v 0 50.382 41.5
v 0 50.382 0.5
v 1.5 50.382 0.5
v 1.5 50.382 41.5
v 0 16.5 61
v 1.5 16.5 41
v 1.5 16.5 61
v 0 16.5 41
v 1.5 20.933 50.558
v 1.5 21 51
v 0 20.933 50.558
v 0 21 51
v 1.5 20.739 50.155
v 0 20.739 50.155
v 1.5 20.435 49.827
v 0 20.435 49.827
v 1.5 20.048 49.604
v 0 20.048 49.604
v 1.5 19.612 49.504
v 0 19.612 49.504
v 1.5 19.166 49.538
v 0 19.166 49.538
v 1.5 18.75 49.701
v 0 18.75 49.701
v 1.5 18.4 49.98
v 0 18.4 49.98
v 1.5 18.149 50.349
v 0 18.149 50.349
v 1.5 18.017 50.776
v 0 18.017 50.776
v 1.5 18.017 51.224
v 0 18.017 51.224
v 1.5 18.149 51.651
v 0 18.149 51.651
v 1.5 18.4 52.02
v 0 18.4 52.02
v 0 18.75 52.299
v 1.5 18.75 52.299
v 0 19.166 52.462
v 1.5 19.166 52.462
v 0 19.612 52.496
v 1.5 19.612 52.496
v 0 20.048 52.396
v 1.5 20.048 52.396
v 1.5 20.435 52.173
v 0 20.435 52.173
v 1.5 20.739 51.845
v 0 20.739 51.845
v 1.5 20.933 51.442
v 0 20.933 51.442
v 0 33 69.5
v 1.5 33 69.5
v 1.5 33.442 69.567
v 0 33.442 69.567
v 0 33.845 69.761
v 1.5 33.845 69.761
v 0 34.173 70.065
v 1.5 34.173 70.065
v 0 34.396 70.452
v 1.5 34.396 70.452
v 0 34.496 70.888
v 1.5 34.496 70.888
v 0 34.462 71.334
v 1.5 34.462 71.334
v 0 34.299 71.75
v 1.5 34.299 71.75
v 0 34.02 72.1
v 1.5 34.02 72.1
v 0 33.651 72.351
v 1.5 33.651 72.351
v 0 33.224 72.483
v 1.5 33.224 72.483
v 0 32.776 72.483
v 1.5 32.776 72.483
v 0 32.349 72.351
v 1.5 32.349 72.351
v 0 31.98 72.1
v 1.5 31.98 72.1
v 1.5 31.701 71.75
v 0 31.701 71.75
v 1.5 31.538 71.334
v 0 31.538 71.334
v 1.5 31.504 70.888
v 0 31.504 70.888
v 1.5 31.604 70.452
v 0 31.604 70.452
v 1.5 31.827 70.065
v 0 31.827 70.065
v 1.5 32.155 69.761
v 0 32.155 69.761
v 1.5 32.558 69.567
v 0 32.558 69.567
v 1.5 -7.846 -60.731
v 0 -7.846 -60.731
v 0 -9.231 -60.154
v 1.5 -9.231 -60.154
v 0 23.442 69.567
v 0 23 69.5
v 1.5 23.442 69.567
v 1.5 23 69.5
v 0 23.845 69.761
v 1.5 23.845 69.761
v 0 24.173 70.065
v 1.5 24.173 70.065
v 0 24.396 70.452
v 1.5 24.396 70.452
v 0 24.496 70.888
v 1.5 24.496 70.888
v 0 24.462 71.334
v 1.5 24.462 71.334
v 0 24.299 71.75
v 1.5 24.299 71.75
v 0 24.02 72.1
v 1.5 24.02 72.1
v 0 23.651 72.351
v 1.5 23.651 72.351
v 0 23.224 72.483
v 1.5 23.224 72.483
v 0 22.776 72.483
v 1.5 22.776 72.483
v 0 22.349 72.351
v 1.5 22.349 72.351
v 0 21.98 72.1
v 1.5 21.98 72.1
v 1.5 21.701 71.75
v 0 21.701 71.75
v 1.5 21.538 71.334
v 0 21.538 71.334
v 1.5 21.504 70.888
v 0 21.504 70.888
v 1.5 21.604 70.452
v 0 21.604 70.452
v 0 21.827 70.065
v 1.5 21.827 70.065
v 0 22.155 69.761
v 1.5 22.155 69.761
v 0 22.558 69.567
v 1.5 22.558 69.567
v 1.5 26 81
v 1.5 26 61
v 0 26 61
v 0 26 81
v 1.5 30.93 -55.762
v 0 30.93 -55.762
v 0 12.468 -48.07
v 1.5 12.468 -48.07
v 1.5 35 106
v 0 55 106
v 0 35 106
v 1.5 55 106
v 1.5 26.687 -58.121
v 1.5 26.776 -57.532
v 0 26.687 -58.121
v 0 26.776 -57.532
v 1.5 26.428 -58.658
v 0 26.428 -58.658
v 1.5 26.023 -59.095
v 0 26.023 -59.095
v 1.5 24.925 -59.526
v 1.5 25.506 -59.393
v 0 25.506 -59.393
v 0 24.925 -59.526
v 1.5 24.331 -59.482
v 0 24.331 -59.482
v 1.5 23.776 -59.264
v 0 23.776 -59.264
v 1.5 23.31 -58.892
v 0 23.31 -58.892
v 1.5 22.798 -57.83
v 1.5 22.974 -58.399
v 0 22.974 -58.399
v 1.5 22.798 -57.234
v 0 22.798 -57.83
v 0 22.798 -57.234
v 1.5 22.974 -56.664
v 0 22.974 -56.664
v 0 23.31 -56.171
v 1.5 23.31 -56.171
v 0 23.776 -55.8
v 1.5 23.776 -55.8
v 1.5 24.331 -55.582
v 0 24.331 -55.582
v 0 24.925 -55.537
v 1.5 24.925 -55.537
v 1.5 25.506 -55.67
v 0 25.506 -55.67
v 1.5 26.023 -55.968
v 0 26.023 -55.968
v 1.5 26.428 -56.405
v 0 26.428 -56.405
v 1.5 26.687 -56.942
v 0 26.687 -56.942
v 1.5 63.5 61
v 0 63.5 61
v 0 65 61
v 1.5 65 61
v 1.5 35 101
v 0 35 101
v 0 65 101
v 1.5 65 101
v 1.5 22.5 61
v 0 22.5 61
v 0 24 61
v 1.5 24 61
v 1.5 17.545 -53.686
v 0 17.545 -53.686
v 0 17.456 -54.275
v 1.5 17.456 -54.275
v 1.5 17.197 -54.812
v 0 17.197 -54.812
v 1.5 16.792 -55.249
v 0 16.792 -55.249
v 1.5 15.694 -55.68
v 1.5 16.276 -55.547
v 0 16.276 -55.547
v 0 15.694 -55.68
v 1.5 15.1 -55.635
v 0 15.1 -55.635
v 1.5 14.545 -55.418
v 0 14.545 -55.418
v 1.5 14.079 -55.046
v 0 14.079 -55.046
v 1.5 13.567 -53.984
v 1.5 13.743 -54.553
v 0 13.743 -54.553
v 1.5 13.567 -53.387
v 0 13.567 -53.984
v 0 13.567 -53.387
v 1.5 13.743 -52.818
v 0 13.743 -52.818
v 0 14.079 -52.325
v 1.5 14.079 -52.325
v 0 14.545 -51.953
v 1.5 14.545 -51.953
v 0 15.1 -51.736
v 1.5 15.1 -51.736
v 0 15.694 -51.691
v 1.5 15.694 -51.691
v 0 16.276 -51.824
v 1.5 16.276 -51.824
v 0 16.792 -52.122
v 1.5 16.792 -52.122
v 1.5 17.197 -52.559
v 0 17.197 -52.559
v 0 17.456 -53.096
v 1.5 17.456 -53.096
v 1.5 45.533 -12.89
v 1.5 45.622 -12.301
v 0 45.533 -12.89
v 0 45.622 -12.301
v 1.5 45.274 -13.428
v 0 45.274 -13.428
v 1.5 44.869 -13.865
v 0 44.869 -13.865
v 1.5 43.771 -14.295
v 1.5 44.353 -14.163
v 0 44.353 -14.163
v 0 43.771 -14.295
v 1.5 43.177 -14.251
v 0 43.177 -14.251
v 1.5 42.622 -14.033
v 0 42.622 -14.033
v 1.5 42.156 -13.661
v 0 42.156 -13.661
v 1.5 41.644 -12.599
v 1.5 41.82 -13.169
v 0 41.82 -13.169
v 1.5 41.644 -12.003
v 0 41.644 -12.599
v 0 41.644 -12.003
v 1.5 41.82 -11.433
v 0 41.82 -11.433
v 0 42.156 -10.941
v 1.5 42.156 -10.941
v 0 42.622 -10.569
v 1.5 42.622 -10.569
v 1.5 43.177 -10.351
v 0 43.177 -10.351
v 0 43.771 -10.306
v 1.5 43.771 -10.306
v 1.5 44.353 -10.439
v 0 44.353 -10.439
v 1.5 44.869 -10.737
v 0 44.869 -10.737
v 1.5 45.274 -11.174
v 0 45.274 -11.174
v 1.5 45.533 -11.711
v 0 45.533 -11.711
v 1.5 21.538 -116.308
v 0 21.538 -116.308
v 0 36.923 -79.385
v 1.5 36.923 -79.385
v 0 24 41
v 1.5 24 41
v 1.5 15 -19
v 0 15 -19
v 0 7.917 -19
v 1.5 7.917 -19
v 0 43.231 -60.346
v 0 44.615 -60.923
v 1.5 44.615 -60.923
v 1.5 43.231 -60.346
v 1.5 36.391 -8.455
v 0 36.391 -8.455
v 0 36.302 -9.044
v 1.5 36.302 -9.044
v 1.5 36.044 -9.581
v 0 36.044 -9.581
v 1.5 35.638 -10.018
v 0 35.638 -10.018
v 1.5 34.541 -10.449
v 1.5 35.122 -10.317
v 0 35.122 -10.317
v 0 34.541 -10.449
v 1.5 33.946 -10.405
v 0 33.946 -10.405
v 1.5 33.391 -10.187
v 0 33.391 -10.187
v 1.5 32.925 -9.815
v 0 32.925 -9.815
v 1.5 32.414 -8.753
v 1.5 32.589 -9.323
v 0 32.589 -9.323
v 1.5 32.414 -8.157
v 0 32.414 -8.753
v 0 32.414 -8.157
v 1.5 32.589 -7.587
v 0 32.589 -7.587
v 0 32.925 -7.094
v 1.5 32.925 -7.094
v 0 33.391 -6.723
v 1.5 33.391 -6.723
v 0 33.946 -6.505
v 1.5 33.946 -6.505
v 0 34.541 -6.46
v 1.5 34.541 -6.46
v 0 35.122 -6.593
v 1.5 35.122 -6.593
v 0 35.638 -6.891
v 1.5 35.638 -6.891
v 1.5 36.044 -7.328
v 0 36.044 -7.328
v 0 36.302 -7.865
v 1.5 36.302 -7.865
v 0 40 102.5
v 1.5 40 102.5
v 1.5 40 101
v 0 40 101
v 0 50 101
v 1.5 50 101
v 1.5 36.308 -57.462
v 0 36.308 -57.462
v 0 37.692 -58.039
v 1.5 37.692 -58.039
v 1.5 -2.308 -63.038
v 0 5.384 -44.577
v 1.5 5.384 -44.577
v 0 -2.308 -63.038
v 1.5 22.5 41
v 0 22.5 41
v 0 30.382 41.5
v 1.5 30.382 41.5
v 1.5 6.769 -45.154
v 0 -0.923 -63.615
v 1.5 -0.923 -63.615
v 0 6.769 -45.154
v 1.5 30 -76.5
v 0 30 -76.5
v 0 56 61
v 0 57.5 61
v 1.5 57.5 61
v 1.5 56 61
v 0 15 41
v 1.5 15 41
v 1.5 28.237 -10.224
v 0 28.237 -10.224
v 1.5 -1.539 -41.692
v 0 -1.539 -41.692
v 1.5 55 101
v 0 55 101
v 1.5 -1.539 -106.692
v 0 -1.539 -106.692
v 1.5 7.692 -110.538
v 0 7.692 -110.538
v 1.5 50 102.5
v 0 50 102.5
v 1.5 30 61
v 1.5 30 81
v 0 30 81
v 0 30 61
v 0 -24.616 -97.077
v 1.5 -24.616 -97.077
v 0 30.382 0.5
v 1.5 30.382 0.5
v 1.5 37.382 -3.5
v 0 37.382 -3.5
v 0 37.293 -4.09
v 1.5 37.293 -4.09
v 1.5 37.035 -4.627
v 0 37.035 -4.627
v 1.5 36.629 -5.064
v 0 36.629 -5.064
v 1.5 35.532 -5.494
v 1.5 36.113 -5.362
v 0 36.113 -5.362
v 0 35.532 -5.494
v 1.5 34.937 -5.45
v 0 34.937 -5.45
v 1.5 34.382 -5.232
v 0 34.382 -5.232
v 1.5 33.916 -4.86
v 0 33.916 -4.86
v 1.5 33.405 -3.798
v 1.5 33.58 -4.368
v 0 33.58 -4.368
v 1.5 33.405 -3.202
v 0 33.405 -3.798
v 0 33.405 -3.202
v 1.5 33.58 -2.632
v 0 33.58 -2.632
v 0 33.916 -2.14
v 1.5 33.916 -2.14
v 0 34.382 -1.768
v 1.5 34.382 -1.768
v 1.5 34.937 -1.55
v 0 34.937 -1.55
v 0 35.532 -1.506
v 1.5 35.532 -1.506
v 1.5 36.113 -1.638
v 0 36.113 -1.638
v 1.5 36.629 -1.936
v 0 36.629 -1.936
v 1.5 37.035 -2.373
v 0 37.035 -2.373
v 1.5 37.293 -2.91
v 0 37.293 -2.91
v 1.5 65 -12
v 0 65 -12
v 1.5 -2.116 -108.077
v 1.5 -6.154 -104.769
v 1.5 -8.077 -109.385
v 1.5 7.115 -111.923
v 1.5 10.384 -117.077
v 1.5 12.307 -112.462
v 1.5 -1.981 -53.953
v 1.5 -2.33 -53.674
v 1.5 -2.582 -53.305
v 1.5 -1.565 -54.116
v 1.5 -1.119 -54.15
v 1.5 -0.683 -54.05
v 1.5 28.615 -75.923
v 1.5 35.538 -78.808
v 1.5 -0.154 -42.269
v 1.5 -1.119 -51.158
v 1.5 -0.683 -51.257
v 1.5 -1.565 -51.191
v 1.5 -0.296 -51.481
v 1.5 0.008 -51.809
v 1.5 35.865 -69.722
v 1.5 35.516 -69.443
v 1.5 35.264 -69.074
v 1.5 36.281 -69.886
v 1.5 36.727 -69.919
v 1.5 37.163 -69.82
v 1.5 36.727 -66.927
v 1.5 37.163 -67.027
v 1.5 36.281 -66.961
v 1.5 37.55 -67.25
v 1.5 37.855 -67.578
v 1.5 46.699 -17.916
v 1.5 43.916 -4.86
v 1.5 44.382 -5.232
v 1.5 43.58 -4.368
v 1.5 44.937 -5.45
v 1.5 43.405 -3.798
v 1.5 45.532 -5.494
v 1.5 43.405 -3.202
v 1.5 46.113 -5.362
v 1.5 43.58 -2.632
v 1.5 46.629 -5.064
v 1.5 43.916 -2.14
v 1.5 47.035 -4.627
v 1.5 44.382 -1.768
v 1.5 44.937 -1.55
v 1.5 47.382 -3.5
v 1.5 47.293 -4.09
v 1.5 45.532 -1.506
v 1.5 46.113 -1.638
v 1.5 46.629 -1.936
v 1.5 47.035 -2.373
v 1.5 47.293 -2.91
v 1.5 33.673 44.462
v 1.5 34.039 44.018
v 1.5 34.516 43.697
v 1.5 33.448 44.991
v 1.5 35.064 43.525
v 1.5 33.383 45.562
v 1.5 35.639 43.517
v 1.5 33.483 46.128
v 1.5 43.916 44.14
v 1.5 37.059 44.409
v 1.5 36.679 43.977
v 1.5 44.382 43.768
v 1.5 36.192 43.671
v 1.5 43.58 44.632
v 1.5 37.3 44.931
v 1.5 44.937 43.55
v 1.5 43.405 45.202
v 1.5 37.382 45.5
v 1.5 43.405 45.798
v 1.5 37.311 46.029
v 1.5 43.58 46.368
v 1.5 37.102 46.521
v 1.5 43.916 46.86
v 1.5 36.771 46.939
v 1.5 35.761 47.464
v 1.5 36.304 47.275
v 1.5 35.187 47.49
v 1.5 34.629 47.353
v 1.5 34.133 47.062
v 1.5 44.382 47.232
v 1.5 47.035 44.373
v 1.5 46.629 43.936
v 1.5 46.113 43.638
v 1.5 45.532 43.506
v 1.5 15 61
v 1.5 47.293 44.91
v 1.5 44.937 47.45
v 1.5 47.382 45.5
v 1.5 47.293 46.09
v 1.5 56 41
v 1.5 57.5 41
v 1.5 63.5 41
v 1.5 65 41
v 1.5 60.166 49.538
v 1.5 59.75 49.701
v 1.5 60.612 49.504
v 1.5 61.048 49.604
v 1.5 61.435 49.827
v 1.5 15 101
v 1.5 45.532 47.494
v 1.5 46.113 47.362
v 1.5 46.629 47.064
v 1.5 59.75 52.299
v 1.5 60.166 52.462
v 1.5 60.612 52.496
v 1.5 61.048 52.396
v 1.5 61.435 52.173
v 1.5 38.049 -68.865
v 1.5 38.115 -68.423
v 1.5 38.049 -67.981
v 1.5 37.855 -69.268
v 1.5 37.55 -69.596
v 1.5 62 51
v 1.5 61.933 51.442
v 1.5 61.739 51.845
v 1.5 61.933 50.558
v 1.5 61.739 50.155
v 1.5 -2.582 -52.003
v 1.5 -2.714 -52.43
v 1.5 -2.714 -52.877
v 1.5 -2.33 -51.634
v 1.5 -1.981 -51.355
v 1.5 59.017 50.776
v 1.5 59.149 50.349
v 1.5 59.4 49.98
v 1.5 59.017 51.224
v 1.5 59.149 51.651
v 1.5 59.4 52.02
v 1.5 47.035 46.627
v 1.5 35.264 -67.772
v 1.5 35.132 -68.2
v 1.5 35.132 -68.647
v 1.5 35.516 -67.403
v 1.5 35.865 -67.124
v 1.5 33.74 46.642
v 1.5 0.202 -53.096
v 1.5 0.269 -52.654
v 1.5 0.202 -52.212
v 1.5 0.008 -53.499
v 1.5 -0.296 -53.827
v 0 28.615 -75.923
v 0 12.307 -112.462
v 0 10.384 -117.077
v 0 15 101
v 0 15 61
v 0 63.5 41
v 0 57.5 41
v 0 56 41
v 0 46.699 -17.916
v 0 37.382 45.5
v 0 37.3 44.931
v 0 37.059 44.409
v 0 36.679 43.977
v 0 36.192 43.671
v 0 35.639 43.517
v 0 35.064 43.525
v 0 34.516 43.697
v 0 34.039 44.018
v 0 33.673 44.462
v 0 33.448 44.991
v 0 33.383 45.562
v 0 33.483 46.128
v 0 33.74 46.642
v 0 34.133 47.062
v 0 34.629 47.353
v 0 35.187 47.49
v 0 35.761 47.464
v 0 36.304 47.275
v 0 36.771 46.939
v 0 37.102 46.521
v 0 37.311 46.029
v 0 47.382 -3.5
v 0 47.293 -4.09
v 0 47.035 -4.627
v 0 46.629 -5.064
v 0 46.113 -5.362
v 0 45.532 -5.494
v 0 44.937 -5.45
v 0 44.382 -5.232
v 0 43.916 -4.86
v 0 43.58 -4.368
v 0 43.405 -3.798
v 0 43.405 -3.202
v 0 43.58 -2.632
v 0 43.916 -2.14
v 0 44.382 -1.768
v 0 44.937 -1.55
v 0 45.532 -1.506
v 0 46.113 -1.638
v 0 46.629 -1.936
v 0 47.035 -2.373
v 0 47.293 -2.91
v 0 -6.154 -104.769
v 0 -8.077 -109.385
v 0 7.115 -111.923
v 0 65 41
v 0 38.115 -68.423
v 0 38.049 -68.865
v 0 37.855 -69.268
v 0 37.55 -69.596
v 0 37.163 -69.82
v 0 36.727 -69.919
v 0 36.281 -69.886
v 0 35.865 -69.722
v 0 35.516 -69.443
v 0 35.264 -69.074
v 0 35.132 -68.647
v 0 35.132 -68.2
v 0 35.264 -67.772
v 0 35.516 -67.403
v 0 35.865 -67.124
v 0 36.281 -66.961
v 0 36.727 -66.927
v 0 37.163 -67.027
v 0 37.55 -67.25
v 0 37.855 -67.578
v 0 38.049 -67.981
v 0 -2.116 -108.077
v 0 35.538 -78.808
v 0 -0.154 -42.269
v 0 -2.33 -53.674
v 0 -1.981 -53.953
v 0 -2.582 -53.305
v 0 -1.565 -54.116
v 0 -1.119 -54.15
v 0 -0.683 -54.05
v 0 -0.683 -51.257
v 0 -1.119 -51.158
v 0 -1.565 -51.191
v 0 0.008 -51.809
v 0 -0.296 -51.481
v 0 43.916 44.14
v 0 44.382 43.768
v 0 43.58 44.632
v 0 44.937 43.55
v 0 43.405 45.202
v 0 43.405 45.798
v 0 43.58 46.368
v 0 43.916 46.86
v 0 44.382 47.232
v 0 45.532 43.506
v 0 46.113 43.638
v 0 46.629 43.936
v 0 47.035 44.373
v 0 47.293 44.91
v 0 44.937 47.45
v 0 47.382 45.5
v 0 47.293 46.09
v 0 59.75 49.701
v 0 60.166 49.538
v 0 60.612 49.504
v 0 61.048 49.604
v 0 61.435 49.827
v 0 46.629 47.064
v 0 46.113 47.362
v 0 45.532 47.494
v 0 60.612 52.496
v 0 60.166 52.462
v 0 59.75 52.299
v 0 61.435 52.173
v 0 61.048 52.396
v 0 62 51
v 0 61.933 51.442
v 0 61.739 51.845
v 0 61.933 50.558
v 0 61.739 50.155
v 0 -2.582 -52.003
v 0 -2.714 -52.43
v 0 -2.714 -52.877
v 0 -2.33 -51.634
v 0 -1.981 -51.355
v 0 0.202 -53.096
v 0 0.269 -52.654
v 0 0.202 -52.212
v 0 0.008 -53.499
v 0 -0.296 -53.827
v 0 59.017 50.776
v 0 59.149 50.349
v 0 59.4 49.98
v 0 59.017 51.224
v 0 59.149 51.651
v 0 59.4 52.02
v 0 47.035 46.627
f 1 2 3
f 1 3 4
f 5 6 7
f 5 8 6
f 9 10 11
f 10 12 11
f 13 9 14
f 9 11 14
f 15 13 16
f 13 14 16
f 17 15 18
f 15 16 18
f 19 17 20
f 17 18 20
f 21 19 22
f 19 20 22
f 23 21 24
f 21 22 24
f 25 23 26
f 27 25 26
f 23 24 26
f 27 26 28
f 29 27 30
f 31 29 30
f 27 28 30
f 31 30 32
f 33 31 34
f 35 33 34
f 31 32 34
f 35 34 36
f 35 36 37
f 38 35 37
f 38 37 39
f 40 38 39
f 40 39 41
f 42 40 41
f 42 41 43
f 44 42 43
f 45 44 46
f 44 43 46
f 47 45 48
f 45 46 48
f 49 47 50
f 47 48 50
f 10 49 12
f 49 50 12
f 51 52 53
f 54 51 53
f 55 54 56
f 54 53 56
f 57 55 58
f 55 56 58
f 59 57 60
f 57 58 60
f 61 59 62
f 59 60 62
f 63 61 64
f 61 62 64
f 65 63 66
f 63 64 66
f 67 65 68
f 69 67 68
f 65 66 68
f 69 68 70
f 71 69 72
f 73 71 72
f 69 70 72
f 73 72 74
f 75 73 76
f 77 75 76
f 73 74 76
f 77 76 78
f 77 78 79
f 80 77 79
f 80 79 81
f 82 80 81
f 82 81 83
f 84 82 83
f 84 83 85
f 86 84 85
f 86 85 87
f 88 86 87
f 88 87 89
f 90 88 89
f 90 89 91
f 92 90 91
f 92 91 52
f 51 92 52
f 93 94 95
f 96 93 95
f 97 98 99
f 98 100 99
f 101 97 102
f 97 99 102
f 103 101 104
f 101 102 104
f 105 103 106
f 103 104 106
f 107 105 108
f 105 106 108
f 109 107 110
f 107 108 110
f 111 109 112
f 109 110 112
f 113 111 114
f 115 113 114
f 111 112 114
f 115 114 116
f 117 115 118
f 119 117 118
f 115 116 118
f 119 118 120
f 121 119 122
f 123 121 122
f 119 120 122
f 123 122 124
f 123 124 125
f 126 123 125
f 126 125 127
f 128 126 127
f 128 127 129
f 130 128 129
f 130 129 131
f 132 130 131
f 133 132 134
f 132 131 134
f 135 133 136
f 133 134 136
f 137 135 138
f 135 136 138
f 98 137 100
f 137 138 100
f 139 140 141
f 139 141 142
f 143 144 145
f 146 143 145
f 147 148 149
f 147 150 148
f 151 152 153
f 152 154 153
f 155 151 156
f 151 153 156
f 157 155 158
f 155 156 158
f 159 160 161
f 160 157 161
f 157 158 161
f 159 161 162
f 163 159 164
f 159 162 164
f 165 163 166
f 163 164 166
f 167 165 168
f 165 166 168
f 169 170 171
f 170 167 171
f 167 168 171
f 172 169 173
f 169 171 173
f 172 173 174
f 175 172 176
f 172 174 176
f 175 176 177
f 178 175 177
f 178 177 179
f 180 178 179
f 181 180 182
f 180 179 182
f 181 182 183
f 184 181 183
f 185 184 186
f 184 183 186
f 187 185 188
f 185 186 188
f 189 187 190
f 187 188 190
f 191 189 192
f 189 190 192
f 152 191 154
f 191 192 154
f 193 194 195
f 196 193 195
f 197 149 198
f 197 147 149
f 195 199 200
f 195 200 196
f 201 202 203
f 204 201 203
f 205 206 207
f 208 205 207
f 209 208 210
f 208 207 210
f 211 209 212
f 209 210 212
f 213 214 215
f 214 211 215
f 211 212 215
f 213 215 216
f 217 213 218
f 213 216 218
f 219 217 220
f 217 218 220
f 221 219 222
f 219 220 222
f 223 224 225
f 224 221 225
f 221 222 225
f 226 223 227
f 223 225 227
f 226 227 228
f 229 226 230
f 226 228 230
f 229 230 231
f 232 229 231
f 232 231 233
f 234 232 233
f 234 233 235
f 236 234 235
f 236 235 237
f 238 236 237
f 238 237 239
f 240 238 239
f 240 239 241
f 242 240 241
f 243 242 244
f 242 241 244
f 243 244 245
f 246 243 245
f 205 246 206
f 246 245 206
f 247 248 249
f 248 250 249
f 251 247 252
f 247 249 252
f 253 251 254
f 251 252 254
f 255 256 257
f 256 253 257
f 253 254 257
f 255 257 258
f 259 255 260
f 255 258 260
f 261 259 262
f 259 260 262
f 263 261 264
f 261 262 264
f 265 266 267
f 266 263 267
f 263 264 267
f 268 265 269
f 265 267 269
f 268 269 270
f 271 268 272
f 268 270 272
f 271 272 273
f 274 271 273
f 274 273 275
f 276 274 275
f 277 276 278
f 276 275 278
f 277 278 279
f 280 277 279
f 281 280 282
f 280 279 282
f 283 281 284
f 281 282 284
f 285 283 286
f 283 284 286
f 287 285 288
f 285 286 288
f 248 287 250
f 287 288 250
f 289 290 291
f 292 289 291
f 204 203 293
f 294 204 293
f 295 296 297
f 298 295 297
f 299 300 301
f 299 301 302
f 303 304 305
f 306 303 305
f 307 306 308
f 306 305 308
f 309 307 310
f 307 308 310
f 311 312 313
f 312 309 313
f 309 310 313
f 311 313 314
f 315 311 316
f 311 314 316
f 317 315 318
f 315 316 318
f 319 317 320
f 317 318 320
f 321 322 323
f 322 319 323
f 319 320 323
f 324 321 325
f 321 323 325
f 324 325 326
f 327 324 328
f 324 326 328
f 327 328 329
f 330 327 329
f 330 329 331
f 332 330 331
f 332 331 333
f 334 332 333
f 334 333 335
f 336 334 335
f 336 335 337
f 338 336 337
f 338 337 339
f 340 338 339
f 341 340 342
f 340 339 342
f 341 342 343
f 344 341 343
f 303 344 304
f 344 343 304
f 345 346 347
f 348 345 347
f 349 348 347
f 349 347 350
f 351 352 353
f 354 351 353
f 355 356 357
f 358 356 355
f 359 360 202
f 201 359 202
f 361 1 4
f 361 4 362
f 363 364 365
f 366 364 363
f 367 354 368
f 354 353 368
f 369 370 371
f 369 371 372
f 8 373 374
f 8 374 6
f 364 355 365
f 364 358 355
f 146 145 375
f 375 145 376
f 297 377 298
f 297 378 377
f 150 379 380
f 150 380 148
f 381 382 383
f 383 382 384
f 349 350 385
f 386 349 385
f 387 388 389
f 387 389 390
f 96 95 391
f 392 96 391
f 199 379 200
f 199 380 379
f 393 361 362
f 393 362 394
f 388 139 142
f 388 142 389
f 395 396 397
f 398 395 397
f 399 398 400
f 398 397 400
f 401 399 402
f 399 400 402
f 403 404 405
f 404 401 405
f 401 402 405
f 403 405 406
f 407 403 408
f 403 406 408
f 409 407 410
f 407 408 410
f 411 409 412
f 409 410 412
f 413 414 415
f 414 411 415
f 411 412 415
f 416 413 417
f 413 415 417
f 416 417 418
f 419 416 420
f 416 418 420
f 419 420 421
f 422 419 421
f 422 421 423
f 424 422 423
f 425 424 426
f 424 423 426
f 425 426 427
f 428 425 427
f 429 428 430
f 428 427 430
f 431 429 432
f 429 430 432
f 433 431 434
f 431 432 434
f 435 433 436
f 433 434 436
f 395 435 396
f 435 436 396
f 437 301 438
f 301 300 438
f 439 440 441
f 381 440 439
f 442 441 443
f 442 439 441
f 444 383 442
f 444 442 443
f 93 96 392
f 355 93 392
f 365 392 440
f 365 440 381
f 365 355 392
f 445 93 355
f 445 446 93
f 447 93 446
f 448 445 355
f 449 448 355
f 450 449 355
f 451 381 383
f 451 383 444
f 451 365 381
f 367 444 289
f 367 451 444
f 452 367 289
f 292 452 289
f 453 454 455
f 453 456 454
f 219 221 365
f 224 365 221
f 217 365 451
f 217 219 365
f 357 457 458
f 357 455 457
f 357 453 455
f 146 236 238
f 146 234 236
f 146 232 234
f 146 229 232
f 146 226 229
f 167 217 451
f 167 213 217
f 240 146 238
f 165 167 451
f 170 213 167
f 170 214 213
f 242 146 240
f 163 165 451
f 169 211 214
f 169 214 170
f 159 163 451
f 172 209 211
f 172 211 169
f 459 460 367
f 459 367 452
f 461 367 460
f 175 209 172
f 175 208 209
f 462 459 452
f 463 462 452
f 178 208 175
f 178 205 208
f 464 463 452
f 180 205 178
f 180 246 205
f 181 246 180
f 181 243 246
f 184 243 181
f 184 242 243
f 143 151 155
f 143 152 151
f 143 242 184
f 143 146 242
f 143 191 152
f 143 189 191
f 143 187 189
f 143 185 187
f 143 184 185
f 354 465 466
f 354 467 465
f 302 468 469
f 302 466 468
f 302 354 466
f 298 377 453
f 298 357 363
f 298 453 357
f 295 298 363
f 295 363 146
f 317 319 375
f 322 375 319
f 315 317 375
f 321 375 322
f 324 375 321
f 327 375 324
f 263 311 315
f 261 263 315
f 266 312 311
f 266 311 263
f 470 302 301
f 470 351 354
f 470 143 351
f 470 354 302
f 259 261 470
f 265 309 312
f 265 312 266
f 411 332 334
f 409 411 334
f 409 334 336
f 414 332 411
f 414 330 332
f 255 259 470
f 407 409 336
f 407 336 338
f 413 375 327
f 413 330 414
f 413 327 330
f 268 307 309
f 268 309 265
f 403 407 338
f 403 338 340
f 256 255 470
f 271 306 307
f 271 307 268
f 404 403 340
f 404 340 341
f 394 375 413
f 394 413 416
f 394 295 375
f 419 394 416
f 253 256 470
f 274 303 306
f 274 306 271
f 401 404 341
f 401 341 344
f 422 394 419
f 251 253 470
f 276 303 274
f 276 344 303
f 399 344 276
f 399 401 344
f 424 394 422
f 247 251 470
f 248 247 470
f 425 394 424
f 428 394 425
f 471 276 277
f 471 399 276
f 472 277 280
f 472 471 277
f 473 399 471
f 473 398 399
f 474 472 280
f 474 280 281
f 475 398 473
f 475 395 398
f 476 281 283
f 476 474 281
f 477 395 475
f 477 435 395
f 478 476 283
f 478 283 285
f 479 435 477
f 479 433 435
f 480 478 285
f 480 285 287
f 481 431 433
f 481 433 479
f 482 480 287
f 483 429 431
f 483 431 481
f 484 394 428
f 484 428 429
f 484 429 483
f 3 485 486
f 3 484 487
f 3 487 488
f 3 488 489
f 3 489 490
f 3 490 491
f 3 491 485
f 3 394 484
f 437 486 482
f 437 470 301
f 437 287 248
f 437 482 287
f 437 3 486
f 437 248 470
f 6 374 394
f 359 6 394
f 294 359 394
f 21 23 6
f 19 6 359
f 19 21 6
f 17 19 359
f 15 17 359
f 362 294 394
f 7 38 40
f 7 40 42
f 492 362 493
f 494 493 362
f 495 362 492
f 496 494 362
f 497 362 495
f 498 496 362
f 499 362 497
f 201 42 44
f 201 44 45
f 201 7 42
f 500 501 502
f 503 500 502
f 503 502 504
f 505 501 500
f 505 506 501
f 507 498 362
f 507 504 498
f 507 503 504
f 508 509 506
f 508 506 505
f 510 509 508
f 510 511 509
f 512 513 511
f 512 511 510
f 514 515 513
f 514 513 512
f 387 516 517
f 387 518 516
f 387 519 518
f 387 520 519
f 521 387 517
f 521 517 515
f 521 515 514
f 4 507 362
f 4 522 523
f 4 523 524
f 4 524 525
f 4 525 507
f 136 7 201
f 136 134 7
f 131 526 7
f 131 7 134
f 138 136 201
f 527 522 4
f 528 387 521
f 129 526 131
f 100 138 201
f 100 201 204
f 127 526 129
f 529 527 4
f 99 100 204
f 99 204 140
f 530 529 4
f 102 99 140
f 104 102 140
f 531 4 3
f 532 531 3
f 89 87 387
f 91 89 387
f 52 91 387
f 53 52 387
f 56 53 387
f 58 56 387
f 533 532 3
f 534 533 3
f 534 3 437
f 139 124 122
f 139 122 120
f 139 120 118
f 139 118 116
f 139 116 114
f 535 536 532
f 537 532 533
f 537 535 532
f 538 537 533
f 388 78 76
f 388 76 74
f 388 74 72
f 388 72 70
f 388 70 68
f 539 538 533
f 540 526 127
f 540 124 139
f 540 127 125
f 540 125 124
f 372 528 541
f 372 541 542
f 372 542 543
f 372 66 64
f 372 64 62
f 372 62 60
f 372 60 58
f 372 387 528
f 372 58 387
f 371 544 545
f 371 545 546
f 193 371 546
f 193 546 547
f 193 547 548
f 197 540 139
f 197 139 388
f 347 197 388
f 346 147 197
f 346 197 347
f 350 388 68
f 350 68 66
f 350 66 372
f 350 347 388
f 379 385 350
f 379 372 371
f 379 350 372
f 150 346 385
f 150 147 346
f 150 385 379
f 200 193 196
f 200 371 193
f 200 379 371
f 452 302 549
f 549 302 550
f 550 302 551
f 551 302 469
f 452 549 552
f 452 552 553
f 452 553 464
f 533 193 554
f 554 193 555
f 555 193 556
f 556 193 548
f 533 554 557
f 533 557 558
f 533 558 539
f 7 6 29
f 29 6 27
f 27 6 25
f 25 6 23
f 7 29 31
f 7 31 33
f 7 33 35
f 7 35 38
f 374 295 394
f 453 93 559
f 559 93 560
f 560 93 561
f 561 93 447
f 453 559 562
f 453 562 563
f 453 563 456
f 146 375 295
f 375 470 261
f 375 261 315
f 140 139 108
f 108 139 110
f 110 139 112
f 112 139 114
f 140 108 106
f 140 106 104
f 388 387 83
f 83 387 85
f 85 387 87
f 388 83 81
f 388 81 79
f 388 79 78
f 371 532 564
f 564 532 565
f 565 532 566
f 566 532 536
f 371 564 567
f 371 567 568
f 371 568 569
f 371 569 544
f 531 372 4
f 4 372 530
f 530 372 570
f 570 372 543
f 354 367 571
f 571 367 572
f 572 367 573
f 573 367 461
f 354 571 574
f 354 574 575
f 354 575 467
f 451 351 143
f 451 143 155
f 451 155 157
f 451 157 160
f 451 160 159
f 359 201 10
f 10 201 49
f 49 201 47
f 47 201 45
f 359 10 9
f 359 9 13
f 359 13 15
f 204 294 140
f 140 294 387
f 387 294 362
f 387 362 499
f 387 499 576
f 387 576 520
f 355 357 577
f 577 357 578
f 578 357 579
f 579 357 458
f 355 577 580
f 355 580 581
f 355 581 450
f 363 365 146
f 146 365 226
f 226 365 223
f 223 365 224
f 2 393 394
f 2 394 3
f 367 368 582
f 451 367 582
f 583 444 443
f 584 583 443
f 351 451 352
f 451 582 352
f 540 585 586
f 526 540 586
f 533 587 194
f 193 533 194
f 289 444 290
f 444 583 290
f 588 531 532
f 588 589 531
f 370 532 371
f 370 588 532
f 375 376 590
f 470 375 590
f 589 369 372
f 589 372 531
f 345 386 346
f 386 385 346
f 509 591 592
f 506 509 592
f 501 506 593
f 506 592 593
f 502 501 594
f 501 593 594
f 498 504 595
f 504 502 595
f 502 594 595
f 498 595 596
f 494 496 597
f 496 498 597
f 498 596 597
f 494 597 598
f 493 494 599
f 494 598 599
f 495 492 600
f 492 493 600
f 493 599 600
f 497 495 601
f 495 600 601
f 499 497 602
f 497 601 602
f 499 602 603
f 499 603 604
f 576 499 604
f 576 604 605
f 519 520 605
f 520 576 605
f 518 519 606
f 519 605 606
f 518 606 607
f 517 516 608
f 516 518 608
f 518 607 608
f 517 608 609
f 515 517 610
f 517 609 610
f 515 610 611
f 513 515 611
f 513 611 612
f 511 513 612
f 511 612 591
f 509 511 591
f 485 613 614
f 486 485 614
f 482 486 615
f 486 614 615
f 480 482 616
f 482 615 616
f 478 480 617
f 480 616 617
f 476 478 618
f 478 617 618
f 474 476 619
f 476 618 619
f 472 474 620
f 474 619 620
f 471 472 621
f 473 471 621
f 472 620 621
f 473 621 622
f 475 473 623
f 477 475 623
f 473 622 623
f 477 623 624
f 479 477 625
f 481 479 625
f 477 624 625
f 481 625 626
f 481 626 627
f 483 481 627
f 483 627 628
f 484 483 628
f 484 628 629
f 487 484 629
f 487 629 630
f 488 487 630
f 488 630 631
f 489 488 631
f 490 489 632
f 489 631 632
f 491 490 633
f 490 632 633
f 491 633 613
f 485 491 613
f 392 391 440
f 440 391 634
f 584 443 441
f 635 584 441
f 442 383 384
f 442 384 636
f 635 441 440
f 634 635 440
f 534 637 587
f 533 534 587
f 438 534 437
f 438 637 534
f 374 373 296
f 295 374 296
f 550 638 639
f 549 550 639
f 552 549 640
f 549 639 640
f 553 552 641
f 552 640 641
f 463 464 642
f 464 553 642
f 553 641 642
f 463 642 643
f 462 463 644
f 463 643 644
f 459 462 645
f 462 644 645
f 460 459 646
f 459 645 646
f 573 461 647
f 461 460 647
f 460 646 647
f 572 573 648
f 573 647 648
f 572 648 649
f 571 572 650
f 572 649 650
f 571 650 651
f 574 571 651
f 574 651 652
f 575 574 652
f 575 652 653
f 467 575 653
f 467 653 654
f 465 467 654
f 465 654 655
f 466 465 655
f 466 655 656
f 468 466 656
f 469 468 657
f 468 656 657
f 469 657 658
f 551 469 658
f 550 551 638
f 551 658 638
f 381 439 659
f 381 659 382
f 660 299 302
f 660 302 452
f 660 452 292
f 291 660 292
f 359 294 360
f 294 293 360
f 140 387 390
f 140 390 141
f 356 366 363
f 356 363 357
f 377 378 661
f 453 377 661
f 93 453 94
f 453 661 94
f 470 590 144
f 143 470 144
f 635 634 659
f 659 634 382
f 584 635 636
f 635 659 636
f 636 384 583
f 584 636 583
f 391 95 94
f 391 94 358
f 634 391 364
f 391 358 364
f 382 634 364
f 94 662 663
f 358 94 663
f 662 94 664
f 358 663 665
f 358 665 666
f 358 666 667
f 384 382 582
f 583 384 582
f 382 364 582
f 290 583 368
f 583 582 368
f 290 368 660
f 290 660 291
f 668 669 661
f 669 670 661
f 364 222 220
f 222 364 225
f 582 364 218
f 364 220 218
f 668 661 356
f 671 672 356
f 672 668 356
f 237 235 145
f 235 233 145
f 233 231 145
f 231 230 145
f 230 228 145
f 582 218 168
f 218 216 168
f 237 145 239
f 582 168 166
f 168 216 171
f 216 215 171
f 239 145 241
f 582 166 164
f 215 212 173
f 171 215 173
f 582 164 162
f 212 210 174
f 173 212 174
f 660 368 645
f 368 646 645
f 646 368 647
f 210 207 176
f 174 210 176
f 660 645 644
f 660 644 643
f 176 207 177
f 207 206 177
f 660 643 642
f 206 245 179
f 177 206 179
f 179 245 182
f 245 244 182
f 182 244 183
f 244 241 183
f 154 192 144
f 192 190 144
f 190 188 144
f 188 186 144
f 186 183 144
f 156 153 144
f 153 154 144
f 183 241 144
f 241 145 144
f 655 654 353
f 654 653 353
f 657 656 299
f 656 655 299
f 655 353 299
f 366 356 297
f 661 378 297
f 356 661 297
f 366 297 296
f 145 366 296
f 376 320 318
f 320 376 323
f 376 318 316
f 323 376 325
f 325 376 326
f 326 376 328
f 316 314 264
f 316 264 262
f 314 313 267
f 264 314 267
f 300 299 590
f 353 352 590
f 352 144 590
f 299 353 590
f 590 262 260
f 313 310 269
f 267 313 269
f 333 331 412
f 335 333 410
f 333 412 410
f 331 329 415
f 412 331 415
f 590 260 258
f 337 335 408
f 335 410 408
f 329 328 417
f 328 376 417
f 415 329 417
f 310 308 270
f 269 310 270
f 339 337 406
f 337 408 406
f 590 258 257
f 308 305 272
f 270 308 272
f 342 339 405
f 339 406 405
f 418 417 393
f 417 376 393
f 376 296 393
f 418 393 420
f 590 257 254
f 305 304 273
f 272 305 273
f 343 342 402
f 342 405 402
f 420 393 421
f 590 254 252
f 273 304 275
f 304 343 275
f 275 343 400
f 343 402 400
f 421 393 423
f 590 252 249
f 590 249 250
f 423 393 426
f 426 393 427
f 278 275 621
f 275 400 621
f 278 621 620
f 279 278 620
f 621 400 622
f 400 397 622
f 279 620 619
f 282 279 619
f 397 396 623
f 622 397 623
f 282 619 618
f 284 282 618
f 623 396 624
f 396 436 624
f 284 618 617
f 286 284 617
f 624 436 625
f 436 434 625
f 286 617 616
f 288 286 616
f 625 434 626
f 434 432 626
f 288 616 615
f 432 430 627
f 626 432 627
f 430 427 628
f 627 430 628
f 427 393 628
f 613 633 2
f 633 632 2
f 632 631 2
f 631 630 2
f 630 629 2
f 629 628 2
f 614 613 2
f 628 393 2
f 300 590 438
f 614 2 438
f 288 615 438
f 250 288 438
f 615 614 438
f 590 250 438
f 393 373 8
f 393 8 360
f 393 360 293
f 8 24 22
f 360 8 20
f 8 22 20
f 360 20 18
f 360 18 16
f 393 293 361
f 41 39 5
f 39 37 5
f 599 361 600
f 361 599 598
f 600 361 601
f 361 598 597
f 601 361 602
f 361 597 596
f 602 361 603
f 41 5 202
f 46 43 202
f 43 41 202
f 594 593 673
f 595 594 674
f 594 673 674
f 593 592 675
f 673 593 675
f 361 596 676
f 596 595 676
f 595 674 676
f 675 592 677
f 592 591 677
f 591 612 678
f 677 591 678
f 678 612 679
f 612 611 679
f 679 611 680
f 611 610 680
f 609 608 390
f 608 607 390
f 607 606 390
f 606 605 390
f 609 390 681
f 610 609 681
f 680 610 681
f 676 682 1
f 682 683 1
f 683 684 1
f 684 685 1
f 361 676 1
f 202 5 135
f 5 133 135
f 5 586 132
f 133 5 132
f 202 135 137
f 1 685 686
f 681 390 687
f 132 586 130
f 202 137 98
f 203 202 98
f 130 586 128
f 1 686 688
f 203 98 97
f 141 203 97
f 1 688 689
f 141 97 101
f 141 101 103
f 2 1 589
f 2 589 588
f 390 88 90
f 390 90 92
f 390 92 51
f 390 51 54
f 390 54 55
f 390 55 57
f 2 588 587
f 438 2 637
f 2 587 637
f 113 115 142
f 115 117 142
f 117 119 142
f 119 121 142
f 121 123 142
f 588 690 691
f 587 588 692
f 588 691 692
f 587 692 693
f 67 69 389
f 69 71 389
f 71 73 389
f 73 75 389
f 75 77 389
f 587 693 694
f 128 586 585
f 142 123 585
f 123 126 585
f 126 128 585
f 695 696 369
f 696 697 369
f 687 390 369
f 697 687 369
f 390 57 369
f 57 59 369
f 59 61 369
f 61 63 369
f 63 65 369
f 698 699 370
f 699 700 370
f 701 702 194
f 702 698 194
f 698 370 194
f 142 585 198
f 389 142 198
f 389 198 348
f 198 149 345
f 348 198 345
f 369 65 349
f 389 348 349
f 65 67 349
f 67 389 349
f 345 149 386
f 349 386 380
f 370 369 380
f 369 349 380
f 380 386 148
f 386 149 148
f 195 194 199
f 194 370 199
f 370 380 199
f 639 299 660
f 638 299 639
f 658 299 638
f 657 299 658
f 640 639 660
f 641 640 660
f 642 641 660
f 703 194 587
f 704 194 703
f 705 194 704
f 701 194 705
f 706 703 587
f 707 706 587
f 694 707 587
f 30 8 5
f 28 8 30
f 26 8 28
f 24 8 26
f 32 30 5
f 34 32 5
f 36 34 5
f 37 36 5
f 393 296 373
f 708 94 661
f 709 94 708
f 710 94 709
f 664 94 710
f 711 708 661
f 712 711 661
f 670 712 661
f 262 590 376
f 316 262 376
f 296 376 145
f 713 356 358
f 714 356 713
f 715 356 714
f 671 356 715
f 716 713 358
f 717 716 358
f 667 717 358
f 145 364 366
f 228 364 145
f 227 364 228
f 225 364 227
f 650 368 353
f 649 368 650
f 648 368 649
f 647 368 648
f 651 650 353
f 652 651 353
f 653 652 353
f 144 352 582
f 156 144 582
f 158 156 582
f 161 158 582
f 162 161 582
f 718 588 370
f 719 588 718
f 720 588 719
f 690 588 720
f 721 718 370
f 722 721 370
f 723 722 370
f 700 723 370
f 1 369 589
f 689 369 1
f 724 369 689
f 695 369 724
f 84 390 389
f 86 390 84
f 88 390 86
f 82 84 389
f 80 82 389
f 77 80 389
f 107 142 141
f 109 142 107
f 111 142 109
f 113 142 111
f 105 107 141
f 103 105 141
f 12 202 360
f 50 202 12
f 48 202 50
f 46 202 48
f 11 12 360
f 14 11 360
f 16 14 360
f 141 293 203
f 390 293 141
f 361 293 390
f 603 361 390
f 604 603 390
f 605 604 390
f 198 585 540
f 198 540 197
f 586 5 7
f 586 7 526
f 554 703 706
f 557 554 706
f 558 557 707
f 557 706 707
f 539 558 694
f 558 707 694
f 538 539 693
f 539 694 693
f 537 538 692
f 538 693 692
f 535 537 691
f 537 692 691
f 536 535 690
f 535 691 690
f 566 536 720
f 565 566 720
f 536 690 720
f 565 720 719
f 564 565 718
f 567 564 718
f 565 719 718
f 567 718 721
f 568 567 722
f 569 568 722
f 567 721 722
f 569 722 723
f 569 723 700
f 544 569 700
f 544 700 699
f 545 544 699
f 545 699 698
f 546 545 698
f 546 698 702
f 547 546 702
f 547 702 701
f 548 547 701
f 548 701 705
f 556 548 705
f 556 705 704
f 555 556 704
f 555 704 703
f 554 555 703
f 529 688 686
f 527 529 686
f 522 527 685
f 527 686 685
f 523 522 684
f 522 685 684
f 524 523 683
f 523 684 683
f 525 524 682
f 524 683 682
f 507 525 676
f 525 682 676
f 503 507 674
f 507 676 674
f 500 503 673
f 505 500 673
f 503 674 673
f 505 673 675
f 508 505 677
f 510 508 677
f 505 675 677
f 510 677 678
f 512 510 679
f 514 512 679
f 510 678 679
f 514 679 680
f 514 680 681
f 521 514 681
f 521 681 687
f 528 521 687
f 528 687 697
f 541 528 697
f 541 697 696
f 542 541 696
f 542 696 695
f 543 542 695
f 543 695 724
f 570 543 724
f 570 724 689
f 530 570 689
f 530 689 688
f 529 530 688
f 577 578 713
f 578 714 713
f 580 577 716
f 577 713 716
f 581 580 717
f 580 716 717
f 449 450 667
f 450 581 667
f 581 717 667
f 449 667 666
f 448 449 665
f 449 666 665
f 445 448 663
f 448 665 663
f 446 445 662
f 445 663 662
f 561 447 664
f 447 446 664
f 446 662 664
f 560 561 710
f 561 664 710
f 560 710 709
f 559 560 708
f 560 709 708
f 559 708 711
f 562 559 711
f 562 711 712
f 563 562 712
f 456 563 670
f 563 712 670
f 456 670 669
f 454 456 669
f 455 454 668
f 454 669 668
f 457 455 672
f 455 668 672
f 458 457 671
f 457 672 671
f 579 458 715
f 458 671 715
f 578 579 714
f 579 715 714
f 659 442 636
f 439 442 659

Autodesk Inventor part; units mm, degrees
ref_plane "YZ Plane" through (0, 0, 0) normal (1, 0, 0) x (0, 1, 0)
ref_plane "XZ Plane" through (0, 0, 0) normal (0, 1, 0) x (-1, 0, 0)
ref_plane "XY Plane" through (0, 0, 0) normal (0, 0, 1) x (1, 0, 0)
sketch "Sketch1" plane through (0, 0, 0) normal (1, 0, 0) x (0, 1, 0)
  line L0 (12, -9) -> (2, -9)
  line L1 (2, -9) -> (2, 41)
  line L2 (2, 41) -> (7, 41)
  line L3 (7, 41) -> (7, 31)
  line L4 (7, 31) -> (12, 31)
  line L5 (12, 31) -> (12, -9)
  line L6 (2, 111) -> (12, 111)
  line L7 (12, 111) -> (12, 71)
  line L8 (12, 71) -> (7, 71)
  line L9 (7, 71) -> (7, 61)
  line L10 (7, 61) -> (2, 61)
  line L11 (2, 61) -> (2, 111)
  line L12 (7, 54.5) -> (7, 55)
  line L13 (7, 55) -> (62, 55)
  arc A0 (64, 57) -> (62, 55) centre (64, 55) ccw
  line L14 (64, 57) -> (65, 57)
  arc A1 (67, 55) -> (65, 57) centre (65, 55) ccw
  line L15 (67, 55) -> (102, 55)
  arc A2 (104, 57) -> (102, 55) centre (104, 55) ccw
  line L16 (104, 57) -> (105, 57)
  arc A3 (107, 55) -> (105, 57) centre (105, 55) ccw
  line L17 (107, 55) -> (107, 47)
  arc A4 (105, 45) -> (107, 47) centre (105, 47) ccw
  line L18 (105, 45) -> (104, 45)
  arc A5 (102, 47) -> (104, 45) centre (104, 47) ccw
  line L19 (102, 47) -> (67, 47)
  arc A6 (65, 45) -> (67, 47) centre (65, 47) ccw
  line L20 (65, 45) -> (64, 45)
  arc A7 (62, 47) -> (64, 45) centre (64, 47) ccw
  line L21 (62, 47) -> (7, 47)
  line L22 (7, 47) -> (7, 47.5)
  line L23 (7, 47.5) -> (-5, 47.5)
  line L24 (-5, 47.5) -> (-5, 41)
  line L25 (-5, 41) -> (0, 41)
  line L26 (0, 41) -> (0, 2.0396)
  line L27 (0, 2.0396) -> (0.3922, 1.9612)
  line L28 (0.3922, 1.9612) -> (0, 1.0198)
  line L29 (0, 1.0198) -> (0, 0)
  line L30 (0, 0) -> (-0.3922, 0.0784)
  line L31 (-0.3922, 0.0784) -> (-15.377, -35.885)
  line L32 (-15.377, -35.885) -> (-19.9924, -33.9619)
  line L33 (-19.9924, -33.9619) -> (-22.4924, -39.9619)
  line L34 (-22.4924, -39.9619) -> (-11.4155, -44.5773)
  line L35 (-11.4155, -44.5773) -> (-11.2232, -44.1158)
  line L36 (-11.2232, -44.1158) -> (39.5461, -65.2696)
  arc A8 (42.1615, -64.1927) -> (39.5461, -65.2696) centre (41.3922, -66.0388) ccw
  line L37 (42.1615, -64.1927) -> (43.0845, -64.5773)
  arc A9 (44.1615, -67.1927) -> (43.0845, -64.5773) centre (42.3153, -66.4235) ccw
  line L38 (44.1615, -67.1927) -> (76.4692, -80.6542)
  arc A10 (79.0845, -79.5773) -> (76.4692, -80.6542) centre (78.3153, -81.4235) ccw
  line L39 (79.0845, -79.5773) -> (80.0076, -79.9619)
  arc A11 (81.0845, -82.5773) -> (80.0076, -79.9619) centre (79.2384, -81.8081) ccw
  line L40 (81.0845, -82.5773) -> (78.0076, -89.9619)
  arc A12 (75.3922, -91.0388) -> (78.0076, -89.9619) centre (76.1615, -89.1927) ccw
  line L41 (75.3922, -91.0388) -> (74.4692, -90.6542)
  arc A13 (73.3922, -88.0388) -> (74.4692, -90.6542) centre (75.2384, -88.8081) ccw
  line L42 (73.3922, -88.0388) -> (41.0845, -74.5773)
  arc A14 (38.4692, -75.6542) -> (41.0845, -74.5773) centre (39.2384, -73.8081) ccw
  line L43 (38.4692, -75.6542) -> (37.5461, -75.2696)
  arc A15 (36.4692, -72.6542) -> (37.5461, -75.2696) centre (38.3153, -73.4235) ccw
  line L44 (36.4692, -72.6542) -> (-14.3001, -51.5004)
  line L45 (-14.3001, -51.5004) -> (-14.1078, -51.0388)
  line L46 (-14.1078, -51.0388) -> (-25.1847, -46.4235)
  line L47 (-25.1847, -46.4235) -> (-27.6847, -52.4235)
  line L48 (-27.6847, -52.4235) -> (-23.0693, -54.3465)
  line L49 (-23.0693, -54.3465) -> (-38.8385, -92.1927)
  line L50 (-38.8385, -92.1927) -> (-47.3001, -86.5004)
  line L51 (-47.3001, -86.5004) -> (-30.377, -45.885)
  line L52 (-30.377, -45.885) -> (-39.6078, -42.0388)
  line L53 (-39.6078, -42.0388) -> (-35.7616, -32.8081)
  line L54 (-35.7616, -32.8081) -> (-26.5308, -36.6542)
  line L55 (-26.5308, -36.6542) -> (-10, 3.0198)
  line L56 (-10, 3.0198) -> (-10, 46)
  line L57 (-10, 46) -> (-20, 46)
  line L58 (-20, 46) -> (-20, 56)
  line L59 (-20, 56) -> (-10, 56)
  line L60 (-10, 56) -> (-10, 100)
  line L61 (-10, 100) -> (0, 102)
  line L62 (0, 102) -> (0, 61)
  line L63 (0, 61) -> (-5, 61)
  line L64 (-5, 61) -> (-5, 54.5)
  line L65 (-5, 54.5) -> (7, 54.5)
  line L66 (0, 51) -> (107, 51)
  line L67 (79.5461, -86.2696) -> (-37.6847, -37.4235)
sketch "Sketch2" plane through (0, 0, 0) normal (1, 0, 0) x (0, 1, 0)
  line L0 (0, 0) -> (0, 51)
  line L1 (0, 51) -> (15, 51)
  line L2 (15, 51) -> (15, 101)
  line L3 (15, 101) -> (65, 101)
  line L4 (101.707, 46.9392) -> (84.707, 46.9392)
  line L5 (84.707, 46.9392) -> (34.707, 46.9392)
  line L6 (15, 51) -> (15, 60)
  line L7 (0, 0) -> (0, 1)
  line L8 (0, 1) -> (110.5886, -21.1178)
  line L9 (50.3822, 41.5) -> (30.3822, 41.5)
  line L10 (30.3822, 41.5) -> (30.3822, 0.5)
  line L11 (30.3822, 0.5) -> (50.3822, 0.5)
  line L12 (50.3822, 0.5) -> (50.3822, 41.5)
  line L13 (50.3822, 0.5) -> (45.3822, 0.5)
  line L14 (45.3822, 0.5) -> (45.3822, -3.5)
  line L15 (45.3822, -3.5) -> (35.3822, -3.5)
  circle A0 centre (45.3822, -3.5) radius 2
  circle A1 centre (35.3822, -3.5) radius 2
  line L16 (50.3822, 21) -> (30.3822, 21)
  circle A2 centre (45.3822, 45.5) radius 2
  circle A3 centre (35.3822, 45.5) radius 2
  line L17 (65, 101) -> (65, -12.0001)
  line L18 (0, 51) -> (107.1279, 51)
  line L19 (65, 51) -> (55, 51)
  line L20 (15, 51) -> (25, 51)
  line L21 (-5.3847, -50.9231) -> (-24.6156, -97.0769)
  line L22 (-24.6156, -97.0769) -> (21.5382, -116.3077)
  line L23 (21.5382, -116.3077) -> (65, -12.0001)
  line L24 (15, 51) -> (15, -19)
  line L25 (-5.3847, -50.9231) -> (7.9166, -19)
  line L26 (15, -19) -> (7.9166, -19)
  line L27 (30.9296, -55.7624) -> (12.468, -48.0701)
  line L28 (12.468, -48.0701) -> (28.2374, -10.224)
  line L29 (28.2374, -10.224) -> (46.6989, -17.9163)
  line L30 (46.6989, -17.9163) -> (30.9296, -55.7624)
  circle A4 centre (43.622, -12.3009) radius 2
  circle A5 centre (34.3912, -8.4548) radius 2
  circle A6 centre (24.7757, -57.5317) radius 2
  circle A7 centre (15.545, -53.6855) radius 2
  line L31 (65, 51) -> (65, 41)
  line L32 (65, 41) -> (63.5, 41)
  line L33 (63.5, 41) -> (63.5, 61)
  line L34 (63.5, 61) -> (65, 61)
  line L35 (65, 61) -> (65, 41)
  line L36 (63.5, 61) -> (57.5, 61)
  line L37 (57.5, 61) -> (56, 61)
  line L38 (56, 61) -> (56, 41)
  line L39 (56, 41) -> (57.5, 41)
  line L40 (57.5, 41) -> (57.5, 61)
  line L41 (65, 51) -> (60.5, 51)
  circle A8 centre (60.5, 51) radius 1.5
  line L42 (44.6152, -60.9232) -> (43.2306, -60.3463)
  line L43 (43.2306, -60.3463) -> (35.5383, -78.8078)
  line L44 (35.5383, -78.8078) -> (36.9229, -79.3847)
  line L45 (29.9998, -76.5001) -> (28.6152, -75.9231)
  line L46 (28.6152, -75.9231) -> (36.3076, -57.4616)
  line L47 (36.3076, -57.4616) -> (37.6922, -58.0386)
  line L48 (37.6922, -58.0386) -> (29.9998, -76.5001)
  circle A9 centre (36.6152, -68.4232) radius 1.5
  line L49 (-1.5387, -106.6923) -> (40, -7)
  line L50 (40, 101) -> (40, -7)
  line L51 (40, -68.0997) -> (40, -71.9997)
  circle A10 centre (-1.2309, -52.6538) radius 1.5
  line L52 (5.3845, -44.5769) -> (-2.3078, -63.0385)
  line L53 (-0.9232, -63.6154) -> (6.7691, -45.1539)
  line L54 (6.7691, -45.1539) -> (5.3845, -44.5769)
  line L55 (-2.3078, -63.0385) -> (-0.9232, -63.6154)
  line L56 (-0.1539, -42.2692) -> (-7.8463, -60.7308)
  line L57 (-7.8463, -60.7308) -> (-9.2309, -60.1538)
  line L58 (-1.5386, -41.6923) -> (-0.1539, -42.2692)
  line L59 (15, 41) -> (16.5, 41)
  line L60 (16.5, 41) -> (16.5, 61)
  line L61 (16.5, 61) -> (15, 61)
  line L62 (22.5, 61) -> (24, 61)
  line L63 (24, 61) -> (24, 41)
  line L64 (24, 41) -> (22.5, 41)
  line L65 (22.5, 41) -> (22.5, 61)
  circle A11 centre (19.5, 51) radius 1.5
  dimension "d0" = 51
  dimension "d1" = 15
  dimension "d2" = 50
  dimension "d3" = 50
  dimension "d11" = 17
  dimension "d12" = 50
  dimension "d23" = 9
  dimension "d34" = 1
  dimension "d35" = 78.69
  dimension "d36" = 20
  dimension "d37" = 41
  dimension "d38" = 5
  dimension "d39" = 4
  dimension "d40" = 10
  dimension "d41" = 4
  dimension "d42" = 4
  dimension "d43" = 10
  dimension "d47" = 10
  dimension "d48" = 70
  dimension "d86" = 10
  dimension "d87" = 1.5
  dimension "d88" = 20
  dimension "d89" = 6
  dimension "d90" = 1.5
  dimension "d91" = 20
  dimension "d92" = 4.5
  dimension "d93" = 3
extrude "Extrusion1" add sketch "Sketch2" along normal blind 1.5 contours L24 L59 L60 L18 A11 L65 L64 L63 L50 L9 L10 L11 L8 | L8 L49 L29 L28 L27 L22 L21 L57 L56 L58 L25 L26 L24 | L2 L61 L60 L18 | L18 L60 L59 L24 | L50 L15 A0 L14 L11 L12 L9 L5 A2 L38 L39 L40 L33 L32 L17 L8 | L8 L23 L42 L43 L44 L22 L49 L27 L30 L29 | L60 L61 L2 L3 L50 L18 L63 L62 L65 A11 | L50 L11 L14 A0 L15 | A11 L18 | L18 A11 | L32 L33 L5 L17 | L23 L51 L43 L42 | L58 L56 L57 L21 L25 | L5 L33 L18 L17 | L23 L44 L43 L51 | L3 L17 L34 L36 L37 L38 L18 L50 | L65 L62 L63 L18 | L18 L63 L64 L65 | L5 L40 L18 A8 L33 | L18 L33 L34 L17 | L18 L38 L5 A2 L50 | L40 L39 L38 L5 | L5 L38 L18 L40 | L18 A8 L40 L36 L33 | L18 L38 L37 L40 | A8 L18 | L18 A8 | L45 L46 L47 L48 | A9 | A10 | L54 L53 L55 L52
sketch "Sketch3" plane through (1.5, 0, 0) normal (1, 0, 0) x (0, 0, -1)
  line L0 (-101, 65) -> (-101, 15) projected
  line L1 (-101, 65) -> (-101, 55)
  line L2 (-101, 55) -> (-106, 55)
  line L3 (-106, 55) -> (-106, 35)
  line L4 (-106, 35) -> (-101, 35)
  line L5 (-101, 55) -> (-101, 50)
  line L6 (-101, 50) -> (-102.5, 50)
  line L7 (-102.5, 50) -> (-102.5, 40)
  line L8 (-102.5, 40) -> (-101, 40)
  line L9 (-101, 40) -> (-101, 50)
  line L10 (-1, 0) -> (21.1178, 110.5886) projected
  line L11 (116.3077, 21.5382) -> (97.0769, -24.6156)
  line L12 (112.4616, 12.3074) -> (117.0769, 10.3843)
  line L13 (117.0769, 10.3843) -> (109.3846, -8.0772)
  line L14 (109.3846, -8.0772) -> (104.7692, -6.1541)
  line L15 (110.5385, 7.692) -> (111.9231, 7.1151)
  line L16 (111.9231, 7.1151) -> (108.0769, -2.1156)
  line L17 (108.0769, -2.1156) -> (106.6923, -1.5387)
  point P0 (0, 0)
  point P1 (106.6923, -1.5387)
  dimension "d66" = 10
  dimension "d67" = 5
  dimension "d68" = 20
  dimension "d69" = 5
  dimension "d70" = 1.5
  dimension "d71" = 10
extrude "Extrusion2" add sketch "Sketch3" against normal blind 1.5 contours L0 L6 L7 L8 L4 L3 L2
extrude "Extrusion3" add sketch "Sketch3" against normal blind 1.5 contours L12 L13 L14 L11 L17 L16 L15
sketch "Sketch4" plane through (1.5, 0, 0) normal (1, 0, 0) x (0, 0, -1)
  line L0 (-101, 15) -> (19, 15) projected
  line L1 (-101, 15) -> (-101, 30)
  line L2 (-101, 35) -> (-101, 15) projected
  line L3 (-101, 30) -> (-81, 30)
  line L4 (-81, 30) -> (-61, 30)
  line L5 (-61, 30) -> (-61, 26)
  line L6 (-61, 26) -> (-81, 26)
  line L7 (-81, 26) -> (-81, 30)
  line L8 (-71, 30) -> (-71, 33)
  line L9 (-71, 33) -> (-71, 23)
  circle A0 centre (-71, 33) radius 1.5
  circle A1 centre (-71, 23) radius 1.5
  point P0 (0, 0)
  dimension "d76" = 15
  dimension "d77" = 20
  dimension "d78" = 20
  dimension "d79" = 4
  dimension "d80" = 3
  dimension "d81" = 10
  dimension "d82" = 3
  dimension "d83" = 3
extrude "Extrusion6" cut sketch "Sketch2" along normal blind 1.5 contours L2 L61 L60 L18 | L18 L60 L59 L24 | A11 L18 | L18 A11 | L32 L33 L5 L17 | L58 L56 L57 L21 L25 | L5 L33 L18 L17 | L65 L62 L63 L18 | L18 L63 L64 L65 | L18 L33 L34 L17 | L40 L39 L38 L5 | L5 L38 L18 L40 | L18 L38 L37 L40 | A8 L18 | L18 A8 | A10 | L54 L53 L55 L52
extrude "Extrusion7" cut sketch "Sketch2" along normal blind 1.5 contours L23 L51 L43 L42 | L23 L44 L43 L51 | L45 L46 L47 L48 | A9
extrude "Extrusion8" cut sketch "Sketch4" against normal blind 1.5 contours A0 | L4 L9 L6 L7 | L4 L5 L6 L9
extrude "Extrusion9" cut sketch "Sketch4" against normal blind 10 contours A1
properties part number "centralFinal"
